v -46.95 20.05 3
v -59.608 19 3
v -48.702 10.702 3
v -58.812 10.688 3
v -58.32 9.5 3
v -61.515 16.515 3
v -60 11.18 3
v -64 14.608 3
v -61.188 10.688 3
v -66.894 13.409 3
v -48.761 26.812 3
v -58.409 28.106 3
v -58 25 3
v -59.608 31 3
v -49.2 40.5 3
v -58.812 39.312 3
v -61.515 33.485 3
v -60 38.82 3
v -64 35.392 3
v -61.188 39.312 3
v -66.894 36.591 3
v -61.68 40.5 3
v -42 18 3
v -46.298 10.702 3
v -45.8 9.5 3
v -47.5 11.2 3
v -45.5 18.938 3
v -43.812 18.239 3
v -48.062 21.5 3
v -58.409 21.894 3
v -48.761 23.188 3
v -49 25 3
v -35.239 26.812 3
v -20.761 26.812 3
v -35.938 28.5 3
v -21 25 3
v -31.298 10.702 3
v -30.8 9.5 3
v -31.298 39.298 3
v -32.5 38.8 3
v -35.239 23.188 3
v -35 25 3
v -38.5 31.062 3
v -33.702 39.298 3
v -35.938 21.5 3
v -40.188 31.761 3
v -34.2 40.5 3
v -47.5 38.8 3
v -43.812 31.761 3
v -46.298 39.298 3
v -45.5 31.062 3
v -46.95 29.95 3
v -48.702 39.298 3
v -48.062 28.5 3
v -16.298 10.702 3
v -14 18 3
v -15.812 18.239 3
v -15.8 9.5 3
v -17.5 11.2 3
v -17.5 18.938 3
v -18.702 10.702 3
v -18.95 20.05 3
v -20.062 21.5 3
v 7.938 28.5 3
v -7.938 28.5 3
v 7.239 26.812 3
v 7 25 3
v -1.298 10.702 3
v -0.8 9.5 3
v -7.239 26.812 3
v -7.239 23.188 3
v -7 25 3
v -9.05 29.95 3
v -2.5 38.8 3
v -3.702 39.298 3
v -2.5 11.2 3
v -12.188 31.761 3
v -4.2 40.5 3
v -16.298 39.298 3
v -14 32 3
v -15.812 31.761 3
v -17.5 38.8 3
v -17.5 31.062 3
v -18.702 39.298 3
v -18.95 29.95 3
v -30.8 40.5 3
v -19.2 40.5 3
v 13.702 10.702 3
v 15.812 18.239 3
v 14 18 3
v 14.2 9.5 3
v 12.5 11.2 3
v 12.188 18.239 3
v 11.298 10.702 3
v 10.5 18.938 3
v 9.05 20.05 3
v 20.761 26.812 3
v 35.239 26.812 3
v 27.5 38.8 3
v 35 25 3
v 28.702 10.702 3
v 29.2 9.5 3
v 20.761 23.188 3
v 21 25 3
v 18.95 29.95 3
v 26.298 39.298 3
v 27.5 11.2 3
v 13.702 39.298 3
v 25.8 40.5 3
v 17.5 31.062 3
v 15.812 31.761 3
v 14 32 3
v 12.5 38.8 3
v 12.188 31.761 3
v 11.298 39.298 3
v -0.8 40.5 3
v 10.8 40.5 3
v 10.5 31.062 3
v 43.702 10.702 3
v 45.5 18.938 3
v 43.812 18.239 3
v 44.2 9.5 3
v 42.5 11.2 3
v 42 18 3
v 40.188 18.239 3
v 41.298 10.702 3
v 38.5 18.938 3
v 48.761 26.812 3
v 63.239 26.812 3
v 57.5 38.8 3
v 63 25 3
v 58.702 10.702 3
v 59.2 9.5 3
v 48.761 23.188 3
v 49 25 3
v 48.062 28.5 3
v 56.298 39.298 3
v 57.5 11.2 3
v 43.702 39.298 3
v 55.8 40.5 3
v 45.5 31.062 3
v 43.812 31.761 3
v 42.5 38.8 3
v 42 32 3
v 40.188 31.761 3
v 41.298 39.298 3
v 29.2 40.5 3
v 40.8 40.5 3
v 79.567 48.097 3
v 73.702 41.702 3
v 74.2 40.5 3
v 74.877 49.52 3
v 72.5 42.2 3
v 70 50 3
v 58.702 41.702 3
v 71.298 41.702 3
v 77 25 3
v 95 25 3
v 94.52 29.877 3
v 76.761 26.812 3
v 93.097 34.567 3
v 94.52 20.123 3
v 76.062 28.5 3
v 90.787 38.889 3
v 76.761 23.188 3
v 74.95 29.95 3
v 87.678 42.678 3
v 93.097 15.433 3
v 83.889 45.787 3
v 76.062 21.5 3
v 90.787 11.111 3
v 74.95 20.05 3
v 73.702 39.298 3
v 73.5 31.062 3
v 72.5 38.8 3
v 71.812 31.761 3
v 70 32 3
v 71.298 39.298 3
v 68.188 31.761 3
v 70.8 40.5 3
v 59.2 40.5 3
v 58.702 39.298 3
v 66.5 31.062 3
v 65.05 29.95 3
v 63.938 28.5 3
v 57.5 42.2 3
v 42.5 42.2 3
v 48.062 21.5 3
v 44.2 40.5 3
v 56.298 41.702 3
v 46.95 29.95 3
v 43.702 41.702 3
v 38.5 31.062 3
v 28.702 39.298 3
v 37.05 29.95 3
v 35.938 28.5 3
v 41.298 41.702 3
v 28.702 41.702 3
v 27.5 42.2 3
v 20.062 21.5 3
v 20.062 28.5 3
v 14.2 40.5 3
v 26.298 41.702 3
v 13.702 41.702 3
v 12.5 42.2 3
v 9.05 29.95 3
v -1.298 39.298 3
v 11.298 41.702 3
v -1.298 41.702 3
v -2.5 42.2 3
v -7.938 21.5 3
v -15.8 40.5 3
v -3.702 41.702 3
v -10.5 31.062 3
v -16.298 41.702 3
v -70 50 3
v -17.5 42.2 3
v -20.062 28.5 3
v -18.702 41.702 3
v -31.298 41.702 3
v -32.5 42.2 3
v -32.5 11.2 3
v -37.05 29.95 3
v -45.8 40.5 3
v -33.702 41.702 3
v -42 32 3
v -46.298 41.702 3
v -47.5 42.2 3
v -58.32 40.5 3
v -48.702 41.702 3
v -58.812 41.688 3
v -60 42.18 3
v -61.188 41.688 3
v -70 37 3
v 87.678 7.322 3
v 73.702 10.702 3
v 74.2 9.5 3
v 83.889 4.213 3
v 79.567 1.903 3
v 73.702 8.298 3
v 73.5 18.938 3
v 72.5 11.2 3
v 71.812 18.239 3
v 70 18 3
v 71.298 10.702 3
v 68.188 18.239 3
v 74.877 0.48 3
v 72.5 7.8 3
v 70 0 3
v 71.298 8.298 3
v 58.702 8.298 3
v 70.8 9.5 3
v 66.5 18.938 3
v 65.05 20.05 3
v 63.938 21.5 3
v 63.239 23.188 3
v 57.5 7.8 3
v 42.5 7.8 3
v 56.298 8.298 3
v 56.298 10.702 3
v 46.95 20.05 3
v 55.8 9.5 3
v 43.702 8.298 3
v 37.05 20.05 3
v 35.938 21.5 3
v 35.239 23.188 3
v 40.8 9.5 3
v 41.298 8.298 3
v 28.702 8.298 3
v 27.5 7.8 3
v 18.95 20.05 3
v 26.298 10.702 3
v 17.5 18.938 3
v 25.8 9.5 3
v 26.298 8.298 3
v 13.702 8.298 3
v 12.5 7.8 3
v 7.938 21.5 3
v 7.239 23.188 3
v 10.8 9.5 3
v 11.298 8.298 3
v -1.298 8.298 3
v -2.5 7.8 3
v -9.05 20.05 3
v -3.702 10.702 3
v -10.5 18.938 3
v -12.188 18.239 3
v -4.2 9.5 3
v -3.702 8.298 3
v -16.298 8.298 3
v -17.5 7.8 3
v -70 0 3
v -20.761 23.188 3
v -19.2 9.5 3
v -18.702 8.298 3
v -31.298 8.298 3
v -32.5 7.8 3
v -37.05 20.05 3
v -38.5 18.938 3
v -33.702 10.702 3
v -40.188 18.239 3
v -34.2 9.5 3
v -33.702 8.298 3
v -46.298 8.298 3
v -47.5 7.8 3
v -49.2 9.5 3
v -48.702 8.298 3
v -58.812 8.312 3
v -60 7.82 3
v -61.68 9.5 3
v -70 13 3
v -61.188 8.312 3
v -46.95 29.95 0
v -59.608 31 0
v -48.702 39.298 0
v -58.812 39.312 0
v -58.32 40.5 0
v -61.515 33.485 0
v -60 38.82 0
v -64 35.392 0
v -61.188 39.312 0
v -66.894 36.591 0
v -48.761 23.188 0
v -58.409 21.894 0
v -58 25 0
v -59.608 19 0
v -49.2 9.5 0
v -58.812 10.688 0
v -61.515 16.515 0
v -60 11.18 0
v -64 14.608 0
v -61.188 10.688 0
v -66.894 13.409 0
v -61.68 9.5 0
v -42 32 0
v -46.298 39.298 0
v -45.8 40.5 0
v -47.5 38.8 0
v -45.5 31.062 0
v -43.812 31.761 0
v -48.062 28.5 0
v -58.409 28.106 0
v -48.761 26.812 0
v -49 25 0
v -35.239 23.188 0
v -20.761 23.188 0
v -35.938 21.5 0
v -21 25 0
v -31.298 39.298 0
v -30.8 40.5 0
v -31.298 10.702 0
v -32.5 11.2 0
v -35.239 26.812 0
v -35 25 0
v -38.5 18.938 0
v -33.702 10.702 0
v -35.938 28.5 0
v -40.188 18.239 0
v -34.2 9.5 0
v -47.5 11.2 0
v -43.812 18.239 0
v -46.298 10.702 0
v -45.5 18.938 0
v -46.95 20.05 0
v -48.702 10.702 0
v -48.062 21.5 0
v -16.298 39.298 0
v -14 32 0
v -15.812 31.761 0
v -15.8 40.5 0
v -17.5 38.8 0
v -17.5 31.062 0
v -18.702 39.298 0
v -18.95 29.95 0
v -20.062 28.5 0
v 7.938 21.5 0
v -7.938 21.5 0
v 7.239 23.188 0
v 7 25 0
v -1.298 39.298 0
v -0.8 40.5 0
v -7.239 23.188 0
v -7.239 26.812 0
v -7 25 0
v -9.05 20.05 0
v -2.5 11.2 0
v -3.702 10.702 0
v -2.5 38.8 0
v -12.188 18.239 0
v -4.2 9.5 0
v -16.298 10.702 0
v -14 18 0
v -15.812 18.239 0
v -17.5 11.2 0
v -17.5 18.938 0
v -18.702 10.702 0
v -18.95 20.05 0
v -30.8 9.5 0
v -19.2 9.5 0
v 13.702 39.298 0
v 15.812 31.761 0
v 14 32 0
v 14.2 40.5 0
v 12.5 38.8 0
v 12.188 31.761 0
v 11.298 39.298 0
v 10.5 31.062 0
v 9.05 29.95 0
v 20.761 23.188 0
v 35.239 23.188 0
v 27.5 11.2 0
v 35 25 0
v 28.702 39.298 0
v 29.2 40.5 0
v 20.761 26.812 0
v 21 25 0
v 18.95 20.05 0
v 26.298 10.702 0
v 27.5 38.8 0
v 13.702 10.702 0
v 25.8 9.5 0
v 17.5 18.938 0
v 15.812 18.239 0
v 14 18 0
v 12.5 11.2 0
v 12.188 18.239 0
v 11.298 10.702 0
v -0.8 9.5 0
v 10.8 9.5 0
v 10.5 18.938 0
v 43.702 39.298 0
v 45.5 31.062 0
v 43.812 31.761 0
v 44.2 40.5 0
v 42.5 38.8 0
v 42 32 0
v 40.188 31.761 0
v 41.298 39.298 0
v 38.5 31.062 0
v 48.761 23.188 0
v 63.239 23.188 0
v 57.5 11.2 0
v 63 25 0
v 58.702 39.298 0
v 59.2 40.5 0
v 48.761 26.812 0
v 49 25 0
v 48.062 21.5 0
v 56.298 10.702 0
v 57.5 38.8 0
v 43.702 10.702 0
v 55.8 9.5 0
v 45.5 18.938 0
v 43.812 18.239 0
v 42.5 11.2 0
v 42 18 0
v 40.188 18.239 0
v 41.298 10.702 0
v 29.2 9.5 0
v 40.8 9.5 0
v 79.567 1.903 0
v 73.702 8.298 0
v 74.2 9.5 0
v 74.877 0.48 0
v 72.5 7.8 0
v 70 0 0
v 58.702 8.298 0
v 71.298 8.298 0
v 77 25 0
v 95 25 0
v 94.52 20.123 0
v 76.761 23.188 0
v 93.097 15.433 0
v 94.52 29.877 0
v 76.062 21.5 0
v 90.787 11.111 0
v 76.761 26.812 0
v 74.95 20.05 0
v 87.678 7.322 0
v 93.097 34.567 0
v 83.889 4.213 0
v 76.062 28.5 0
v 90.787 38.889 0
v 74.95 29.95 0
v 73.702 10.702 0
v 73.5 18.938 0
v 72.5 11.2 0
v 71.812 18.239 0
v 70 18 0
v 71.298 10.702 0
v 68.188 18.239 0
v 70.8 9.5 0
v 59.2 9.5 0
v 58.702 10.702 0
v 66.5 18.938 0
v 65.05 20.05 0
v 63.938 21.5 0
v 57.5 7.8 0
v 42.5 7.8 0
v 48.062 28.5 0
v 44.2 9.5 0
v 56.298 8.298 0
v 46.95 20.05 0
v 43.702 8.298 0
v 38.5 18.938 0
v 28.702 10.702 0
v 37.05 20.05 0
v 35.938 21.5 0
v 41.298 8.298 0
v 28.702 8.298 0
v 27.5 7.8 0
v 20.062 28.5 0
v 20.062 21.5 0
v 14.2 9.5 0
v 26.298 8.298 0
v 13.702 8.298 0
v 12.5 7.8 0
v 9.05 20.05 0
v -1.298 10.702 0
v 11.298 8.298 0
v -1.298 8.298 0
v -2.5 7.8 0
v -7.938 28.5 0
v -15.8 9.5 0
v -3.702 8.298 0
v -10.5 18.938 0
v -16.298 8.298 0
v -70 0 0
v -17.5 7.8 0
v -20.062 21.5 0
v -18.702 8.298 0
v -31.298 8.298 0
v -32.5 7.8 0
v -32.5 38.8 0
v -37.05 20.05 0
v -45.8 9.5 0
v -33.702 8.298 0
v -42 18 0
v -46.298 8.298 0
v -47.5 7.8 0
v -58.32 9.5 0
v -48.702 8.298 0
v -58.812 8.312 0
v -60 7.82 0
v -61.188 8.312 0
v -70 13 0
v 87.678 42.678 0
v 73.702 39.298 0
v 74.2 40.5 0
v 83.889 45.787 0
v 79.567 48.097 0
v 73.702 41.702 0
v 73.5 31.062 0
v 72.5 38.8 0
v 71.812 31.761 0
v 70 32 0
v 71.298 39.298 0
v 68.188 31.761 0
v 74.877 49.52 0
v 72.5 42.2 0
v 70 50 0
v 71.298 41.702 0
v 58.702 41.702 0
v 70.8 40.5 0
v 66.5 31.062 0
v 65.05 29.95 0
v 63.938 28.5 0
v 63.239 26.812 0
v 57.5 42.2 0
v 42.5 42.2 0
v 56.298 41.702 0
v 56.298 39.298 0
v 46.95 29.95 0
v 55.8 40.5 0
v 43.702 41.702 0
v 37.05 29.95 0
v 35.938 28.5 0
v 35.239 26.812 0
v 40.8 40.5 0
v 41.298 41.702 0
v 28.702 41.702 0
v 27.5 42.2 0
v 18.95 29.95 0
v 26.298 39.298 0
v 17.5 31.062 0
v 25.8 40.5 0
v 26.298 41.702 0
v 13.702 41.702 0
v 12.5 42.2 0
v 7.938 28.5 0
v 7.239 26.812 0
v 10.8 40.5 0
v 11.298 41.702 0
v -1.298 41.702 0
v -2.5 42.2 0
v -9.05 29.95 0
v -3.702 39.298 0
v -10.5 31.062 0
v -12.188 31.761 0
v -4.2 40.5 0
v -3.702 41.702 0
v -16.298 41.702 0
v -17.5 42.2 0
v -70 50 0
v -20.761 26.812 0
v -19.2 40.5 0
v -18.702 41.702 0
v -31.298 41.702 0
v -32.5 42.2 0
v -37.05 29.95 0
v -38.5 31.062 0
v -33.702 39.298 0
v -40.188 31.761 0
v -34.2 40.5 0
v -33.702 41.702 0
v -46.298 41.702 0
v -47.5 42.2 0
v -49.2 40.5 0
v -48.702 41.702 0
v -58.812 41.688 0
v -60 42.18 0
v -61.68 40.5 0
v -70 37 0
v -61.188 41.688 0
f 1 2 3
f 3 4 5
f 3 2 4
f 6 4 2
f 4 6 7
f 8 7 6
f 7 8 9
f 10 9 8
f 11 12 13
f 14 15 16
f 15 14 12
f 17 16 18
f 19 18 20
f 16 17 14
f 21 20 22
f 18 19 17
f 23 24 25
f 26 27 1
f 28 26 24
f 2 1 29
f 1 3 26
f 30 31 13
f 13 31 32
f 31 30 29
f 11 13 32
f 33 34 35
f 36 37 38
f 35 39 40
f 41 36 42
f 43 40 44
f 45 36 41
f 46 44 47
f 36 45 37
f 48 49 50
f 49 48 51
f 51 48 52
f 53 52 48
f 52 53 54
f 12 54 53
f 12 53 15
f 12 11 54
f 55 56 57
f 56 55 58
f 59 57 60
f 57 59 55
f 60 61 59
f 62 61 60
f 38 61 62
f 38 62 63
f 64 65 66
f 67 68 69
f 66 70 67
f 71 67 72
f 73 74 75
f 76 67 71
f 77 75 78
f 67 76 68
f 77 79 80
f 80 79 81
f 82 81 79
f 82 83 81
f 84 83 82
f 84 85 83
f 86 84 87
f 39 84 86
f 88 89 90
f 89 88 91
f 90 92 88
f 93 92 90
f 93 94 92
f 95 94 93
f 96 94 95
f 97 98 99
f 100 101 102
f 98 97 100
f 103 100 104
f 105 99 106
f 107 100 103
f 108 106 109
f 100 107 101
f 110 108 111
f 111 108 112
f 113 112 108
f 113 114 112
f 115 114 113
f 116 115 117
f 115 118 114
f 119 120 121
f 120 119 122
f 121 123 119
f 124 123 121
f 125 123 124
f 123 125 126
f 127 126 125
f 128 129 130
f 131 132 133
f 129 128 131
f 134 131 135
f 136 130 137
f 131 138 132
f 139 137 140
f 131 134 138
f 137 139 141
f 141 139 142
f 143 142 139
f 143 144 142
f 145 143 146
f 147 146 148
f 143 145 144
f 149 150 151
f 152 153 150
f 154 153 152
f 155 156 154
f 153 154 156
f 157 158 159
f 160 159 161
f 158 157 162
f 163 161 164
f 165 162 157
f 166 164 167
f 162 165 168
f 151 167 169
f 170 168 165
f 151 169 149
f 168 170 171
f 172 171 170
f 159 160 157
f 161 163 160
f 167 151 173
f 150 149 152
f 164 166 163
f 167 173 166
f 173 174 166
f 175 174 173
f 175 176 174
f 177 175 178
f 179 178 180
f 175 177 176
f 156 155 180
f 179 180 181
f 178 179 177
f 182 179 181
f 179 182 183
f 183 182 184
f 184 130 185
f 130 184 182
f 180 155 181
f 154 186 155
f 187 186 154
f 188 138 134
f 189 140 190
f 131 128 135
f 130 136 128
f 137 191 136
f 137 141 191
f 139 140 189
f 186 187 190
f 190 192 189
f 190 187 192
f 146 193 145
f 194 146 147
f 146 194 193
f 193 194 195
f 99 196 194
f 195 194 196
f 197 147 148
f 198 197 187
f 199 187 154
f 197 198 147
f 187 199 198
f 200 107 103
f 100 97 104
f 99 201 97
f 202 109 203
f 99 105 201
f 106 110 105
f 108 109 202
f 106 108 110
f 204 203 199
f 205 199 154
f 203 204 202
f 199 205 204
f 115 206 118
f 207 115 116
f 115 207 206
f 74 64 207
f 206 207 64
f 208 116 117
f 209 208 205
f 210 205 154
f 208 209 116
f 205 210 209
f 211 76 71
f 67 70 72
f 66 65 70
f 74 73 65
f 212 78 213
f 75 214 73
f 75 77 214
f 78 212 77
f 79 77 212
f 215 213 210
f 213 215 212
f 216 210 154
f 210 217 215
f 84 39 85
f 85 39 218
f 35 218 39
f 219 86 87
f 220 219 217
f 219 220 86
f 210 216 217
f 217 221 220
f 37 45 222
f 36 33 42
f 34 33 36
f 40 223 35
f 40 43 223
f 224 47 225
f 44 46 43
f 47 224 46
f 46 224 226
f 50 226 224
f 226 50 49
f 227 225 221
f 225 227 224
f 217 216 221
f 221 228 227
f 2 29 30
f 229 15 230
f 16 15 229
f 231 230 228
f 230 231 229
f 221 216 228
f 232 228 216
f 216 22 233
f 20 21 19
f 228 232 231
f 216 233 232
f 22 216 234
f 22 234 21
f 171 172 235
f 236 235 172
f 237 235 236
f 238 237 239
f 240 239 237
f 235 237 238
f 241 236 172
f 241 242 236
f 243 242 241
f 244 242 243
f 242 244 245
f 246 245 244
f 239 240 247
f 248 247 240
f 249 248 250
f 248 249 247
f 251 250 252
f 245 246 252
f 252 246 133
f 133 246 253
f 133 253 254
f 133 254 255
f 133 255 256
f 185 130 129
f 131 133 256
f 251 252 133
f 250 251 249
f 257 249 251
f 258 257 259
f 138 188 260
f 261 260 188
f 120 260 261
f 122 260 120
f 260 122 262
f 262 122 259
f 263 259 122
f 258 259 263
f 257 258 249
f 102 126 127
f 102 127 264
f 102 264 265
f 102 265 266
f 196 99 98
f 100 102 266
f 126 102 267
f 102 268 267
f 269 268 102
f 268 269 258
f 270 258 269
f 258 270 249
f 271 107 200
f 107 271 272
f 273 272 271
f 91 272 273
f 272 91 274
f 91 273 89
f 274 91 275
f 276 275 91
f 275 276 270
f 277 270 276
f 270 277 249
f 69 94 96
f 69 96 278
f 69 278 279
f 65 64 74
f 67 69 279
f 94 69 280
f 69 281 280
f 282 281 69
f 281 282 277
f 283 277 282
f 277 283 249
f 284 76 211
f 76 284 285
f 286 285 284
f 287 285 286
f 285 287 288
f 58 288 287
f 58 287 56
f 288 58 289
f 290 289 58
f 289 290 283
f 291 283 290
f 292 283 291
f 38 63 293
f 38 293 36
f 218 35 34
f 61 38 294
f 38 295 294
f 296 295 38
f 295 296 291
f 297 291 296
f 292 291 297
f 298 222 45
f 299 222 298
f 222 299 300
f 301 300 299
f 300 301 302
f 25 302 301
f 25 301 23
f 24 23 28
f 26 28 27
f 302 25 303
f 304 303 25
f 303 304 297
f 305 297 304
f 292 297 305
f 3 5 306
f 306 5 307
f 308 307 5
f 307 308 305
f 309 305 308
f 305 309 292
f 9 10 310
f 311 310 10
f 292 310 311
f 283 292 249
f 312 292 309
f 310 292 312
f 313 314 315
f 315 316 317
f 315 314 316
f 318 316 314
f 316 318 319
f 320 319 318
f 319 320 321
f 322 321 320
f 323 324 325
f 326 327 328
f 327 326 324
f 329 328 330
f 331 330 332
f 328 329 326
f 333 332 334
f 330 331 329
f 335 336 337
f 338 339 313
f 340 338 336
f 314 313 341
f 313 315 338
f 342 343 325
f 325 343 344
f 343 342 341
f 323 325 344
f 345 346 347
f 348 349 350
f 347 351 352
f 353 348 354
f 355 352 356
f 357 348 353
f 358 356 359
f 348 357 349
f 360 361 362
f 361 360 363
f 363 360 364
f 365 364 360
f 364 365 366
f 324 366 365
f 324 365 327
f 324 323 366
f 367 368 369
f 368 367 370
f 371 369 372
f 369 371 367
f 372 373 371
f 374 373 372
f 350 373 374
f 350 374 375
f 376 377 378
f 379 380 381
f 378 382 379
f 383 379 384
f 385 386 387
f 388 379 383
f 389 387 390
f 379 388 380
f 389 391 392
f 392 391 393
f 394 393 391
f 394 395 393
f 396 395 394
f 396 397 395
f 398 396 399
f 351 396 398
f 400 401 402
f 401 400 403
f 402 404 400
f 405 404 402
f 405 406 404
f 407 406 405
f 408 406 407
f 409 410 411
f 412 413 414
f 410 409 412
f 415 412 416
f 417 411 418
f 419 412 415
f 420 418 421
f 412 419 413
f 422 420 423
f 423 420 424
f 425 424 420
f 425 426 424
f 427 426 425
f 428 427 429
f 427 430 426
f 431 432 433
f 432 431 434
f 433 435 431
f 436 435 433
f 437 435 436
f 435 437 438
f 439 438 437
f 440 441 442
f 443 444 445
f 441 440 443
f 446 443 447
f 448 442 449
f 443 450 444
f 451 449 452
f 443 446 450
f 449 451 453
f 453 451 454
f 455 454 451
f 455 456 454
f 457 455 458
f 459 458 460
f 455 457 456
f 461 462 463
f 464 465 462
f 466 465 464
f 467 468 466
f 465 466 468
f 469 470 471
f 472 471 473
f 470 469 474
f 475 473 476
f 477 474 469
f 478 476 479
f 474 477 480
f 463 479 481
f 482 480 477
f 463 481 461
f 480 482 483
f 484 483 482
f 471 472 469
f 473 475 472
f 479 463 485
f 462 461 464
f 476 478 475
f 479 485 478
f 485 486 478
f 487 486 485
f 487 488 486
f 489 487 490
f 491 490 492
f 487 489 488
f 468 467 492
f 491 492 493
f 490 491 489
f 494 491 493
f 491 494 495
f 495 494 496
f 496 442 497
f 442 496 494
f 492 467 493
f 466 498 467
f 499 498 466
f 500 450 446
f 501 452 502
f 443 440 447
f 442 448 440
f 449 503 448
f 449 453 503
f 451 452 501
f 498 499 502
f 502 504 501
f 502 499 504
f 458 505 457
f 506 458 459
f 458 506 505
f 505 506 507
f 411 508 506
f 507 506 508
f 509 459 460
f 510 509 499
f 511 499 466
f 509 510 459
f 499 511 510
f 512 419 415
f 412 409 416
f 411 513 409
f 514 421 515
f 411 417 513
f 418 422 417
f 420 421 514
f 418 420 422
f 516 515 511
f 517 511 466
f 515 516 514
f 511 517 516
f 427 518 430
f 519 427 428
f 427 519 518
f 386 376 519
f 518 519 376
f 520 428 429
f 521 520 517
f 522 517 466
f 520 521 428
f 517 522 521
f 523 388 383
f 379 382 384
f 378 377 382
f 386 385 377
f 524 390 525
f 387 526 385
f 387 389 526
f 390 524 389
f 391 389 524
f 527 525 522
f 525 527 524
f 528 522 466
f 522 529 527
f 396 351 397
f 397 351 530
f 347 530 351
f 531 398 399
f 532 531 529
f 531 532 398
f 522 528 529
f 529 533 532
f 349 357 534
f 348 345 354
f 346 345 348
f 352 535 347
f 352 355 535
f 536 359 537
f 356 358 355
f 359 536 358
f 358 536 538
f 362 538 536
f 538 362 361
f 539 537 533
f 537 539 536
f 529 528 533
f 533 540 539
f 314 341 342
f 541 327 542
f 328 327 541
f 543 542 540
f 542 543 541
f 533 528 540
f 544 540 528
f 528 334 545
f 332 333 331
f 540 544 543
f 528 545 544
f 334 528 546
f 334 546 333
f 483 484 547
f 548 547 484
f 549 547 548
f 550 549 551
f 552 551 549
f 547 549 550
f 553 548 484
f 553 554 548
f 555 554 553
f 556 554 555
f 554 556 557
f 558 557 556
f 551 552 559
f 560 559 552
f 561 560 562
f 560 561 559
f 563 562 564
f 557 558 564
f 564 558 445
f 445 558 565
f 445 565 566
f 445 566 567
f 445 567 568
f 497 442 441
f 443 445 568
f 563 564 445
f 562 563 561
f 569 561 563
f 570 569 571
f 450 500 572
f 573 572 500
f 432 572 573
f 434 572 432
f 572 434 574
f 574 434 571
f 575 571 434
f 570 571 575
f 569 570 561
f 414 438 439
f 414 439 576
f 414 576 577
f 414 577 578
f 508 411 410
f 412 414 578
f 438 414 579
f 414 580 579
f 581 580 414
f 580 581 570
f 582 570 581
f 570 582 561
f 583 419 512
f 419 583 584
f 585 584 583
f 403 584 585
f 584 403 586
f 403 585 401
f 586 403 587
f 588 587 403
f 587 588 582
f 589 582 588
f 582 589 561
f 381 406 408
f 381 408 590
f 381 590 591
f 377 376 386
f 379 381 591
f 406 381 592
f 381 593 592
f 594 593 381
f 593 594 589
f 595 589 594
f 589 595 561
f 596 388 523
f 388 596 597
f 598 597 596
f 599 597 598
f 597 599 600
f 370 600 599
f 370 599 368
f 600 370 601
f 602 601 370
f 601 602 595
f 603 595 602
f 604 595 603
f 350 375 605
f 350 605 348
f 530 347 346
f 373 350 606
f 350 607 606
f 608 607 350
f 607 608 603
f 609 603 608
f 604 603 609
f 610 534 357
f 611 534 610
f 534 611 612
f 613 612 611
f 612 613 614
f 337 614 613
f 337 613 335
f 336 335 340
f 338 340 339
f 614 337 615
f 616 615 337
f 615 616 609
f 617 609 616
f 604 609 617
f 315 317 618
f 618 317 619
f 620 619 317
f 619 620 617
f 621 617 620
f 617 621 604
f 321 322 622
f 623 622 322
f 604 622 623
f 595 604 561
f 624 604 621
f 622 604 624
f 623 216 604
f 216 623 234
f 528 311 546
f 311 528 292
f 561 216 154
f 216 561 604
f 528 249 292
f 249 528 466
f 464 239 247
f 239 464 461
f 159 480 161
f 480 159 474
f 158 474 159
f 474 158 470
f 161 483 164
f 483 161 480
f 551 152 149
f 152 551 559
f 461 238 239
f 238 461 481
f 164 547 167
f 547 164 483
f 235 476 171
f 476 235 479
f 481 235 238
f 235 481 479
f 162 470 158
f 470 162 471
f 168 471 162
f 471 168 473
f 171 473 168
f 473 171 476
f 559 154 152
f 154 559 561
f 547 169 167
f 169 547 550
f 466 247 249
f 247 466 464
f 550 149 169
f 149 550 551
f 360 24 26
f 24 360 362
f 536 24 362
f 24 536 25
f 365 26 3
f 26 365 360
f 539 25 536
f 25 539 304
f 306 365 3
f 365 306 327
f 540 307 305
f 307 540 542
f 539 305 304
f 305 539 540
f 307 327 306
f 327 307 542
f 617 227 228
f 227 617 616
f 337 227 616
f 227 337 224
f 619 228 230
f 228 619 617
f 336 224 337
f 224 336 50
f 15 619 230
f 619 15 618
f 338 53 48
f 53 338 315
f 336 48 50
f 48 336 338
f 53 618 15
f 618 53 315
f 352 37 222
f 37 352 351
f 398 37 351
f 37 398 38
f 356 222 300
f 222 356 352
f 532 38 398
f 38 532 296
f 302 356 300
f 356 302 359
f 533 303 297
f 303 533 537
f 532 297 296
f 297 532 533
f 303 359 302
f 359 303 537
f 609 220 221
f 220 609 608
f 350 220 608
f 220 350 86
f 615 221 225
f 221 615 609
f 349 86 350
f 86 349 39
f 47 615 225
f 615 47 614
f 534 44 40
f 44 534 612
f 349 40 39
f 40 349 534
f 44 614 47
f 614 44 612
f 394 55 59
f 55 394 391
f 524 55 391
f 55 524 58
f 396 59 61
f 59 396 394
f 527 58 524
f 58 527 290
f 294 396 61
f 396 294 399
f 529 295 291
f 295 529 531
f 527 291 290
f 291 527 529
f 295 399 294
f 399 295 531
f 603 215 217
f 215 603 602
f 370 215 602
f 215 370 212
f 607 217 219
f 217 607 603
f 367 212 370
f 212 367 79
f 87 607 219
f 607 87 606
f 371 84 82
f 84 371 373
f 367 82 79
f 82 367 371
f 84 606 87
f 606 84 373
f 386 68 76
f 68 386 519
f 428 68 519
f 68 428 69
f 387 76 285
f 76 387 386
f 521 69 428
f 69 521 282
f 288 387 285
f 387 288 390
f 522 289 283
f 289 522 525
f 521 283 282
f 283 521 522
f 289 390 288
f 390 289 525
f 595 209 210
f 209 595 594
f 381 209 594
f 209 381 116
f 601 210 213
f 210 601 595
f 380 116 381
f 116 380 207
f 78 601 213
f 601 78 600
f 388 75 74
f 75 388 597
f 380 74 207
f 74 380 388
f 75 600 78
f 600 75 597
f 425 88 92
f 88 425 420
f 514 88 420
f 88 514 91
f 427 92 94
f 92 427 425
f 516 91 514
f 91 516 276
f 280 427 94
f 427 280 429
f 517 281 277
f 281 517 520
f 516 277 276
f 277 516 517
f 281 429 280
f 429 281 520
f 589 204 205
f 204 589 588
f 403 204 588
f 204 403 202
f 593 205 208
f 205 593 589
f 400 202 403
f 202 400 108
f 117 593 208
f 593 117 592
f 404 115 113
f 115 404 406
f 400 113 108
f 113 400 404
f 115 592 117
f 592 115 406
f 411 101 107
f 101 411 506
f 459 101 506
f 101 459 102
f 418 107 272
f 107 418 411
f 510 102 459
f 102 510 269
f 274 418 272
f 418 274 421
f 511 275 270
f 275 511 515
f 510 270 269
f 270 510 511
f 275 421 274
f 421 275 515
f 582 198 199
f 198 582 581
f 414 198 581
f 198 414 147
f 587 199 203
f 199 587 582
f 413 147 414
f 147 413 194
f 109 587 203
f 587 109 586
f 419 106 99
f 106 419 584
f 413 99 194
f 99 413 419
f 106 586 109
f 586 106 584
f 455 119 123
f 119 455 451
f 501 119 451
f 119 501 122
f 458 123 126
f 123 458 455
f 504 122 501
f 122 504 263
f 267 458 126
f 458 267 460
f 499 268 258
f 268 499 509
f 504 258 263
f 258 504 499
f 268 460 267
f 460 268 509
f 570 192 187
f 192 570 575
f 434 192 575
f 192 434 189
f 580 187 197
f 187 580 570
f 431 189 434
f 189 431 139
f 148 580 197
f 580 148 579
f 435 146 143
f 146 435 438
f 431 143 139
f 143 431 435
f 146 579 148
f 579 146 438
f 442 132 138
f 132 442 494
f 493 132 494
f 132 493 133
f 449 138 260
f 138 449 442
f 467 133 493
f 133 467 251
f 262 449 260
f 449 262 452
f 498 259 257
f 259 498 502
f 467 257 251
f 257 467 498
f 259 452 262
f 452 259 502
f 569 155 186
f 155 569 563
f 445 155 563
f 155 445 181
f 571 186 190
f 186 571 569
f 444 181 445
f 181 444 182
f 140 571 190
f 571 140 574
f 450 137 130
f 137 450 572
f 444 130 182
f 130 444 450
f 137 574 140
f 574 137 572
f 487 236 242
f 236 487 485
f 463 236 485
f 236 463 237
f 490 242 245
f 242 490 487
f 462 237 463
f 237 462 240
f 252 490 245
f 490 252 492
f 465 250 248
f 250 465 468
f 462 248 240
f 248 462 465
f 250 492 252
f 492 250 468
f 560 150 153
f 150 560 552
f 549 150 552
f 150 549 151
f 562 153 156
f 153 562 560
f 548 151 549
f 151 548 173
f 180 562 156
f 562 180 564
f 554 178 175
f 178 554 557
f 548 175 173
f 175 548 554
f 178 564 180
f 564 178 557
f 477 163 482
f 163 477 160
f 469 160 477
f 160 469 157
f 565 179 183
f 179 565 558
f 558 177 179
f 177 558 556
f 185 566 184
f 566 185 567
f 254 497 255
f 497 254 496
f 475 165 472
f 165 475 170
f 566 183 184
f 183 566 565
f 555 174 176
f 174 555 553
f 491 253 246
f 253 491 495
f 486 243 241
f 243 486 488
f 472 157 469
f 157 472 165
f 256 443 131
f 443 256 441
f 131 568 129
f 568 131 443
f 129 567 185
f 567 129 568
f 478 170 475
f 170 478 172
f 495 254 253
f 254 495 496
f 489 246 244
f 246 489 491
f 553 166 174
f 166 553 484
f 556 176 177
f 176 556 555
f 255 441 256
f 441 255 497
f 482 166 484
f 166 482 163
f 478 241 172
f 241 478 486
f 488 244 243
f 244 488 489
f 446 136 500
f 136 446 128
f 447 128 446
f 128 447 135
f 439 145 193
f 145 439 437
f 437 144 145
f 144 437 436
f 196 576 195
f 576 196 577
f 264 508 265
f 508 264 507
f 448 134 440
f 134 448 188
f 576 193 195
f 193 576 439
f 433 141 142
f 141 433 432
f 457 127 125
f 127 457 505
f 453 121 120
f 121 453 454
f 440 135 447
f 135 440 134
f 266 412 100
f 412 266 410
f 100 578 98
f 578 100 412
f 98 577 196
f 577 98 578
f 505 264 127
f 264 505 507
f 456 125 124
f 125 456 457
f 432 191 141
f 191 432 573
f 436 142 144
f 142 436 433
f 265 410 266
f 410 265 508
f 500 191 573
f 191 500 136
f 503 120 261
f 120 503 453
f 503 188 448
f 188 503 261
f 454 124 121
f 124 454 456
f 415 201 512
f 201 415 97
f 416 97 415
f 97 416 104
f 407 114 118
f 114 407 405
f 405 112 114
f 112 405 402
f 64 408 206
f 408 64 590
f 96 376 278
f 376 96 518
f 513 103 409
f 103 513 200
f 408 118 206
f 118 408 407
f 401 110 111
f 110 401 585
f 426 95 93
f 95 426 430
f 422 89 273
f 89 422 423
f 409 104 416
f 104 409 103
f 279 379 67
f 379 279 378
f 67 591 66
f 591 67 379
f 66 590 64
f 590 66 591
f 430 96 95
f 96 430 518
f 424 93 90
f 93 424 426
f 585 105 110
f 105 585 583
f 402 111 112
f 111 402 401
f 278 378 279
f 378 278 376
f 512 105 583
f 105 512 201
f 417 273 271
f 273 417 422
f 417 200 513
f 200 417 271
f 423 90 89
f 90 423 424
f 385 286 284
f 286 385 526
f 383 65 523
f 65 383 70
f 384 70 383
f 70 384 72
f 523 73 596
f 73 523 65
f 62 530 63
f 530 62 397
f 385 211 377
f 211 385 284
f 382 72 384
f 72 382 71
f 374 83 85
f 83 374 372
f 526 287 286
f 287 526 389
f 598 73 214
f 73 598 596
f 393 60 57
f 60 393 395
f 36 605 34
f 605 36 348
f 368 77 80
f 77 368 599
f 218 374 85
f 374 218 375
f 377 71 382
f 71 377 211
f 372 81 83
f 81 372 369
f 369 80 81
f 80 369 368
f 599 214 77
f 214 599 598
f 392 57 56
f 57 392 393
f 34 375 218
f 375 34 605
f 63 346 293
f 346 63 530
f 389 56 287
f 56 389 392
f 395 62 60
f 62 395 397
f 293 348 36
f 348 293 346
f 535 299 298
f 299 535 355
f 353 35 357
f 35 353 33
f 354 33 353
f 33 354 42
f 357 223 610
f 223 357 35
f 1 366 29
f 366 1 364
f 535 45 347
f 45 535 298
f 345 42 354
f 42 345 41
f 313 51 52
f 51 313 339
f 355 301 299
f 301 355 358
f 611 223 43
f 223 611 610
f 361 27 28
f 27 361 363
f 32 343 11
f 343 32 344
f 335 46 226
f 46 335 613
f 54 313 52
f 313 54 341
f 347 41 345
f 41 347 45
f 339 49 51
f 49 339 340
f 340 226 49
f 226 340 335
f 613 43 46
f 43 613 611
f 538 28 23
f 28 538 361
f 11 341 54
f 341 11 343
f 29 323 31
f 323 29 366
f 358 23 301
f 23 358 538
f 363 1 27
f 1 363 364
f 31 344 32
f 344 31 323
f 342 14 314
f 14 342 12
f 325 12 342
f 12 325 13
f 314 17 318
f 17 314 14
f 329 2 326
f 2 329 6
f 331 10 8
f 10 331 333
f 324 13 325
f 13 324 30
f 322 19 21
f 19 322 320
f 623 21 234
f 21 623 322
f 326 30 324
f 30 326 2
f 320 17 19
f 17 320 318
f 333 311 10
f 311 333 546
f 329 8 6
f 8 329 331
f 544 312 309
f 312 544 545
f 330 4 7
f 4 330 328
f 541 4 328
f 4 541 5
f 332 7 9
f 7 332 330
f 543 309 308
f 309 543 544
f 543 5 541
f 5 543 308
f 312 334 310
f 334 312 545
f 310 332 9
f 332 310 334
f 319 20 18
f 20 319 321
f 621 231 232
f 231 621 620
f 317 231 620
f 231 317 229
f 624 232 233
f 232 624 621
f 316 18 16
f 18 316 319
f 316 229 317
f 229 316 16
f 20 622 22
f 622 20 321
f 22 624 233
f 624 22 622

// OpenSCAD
// file: dimensions.scad
// Originally created by Jose Julio
// https://github.com/JJulio/b-robot

SHARED_HEIGHT = 140;
SHARED_LENGTH = 102;
SHARED_WIDTH  = 50;
// main file
// Originally created by Jose Julio
// https://github.com/JJulio/b-robot

include <dimensions.scad>;

module upright()
{
  translate([-(SHARED_HEIGHT)/2,0,0]) cube([SHARED_HEIGHT,SHARED_WIDTH,3]);
  translate([(SHARED_HEIGHT/2),SHARED_WIDTH/2,1.5]) cylinder(r=SHARED_WIDTH/2,h=3,$fn=32,center=true);
}

module upright_holes()
{
  // Motor shaft hole
  translate([-SHARED_HEIGHT/2,SHARED_WIDTH/2,0]) cylinder(r=12,h=10,$fn=24,center=true);
  // Motor mount holes
  translate([-(SHARED_HEIGHT-20)/2,9.5,0]) cylinder(r=1.68,h=10,$fn=8,center=true);
  translate([-(SHARED_HEIGHT-20)/2,9.5+31,0]) cylinder(r=1.68,h=10,$fn=8,center=true);

  //Holes
  for ( i = [0 : 8] ){
    translate([-(SHARED_HEIGHT-45-i*30)/2,9.5,0]) cylinder(r=1.7,h=10,$fn=8,center=true);
    translate([-(SHARED_HEIGHT-45-i*30)/2,9.5+31,0]) cylinder(r=1.7,h=10,$fn=8,center=true);
  }

  // Light holes
  for ( i = [0 : 8] ){
    translate([(SHARED_HEIGHT/2)-i*28,SHARED_WIDTH/2,0]) cylinder(r=7,h=8,$fn=24,center=true);
  }
}

difference()
{
upright();
upright_holes();
}
